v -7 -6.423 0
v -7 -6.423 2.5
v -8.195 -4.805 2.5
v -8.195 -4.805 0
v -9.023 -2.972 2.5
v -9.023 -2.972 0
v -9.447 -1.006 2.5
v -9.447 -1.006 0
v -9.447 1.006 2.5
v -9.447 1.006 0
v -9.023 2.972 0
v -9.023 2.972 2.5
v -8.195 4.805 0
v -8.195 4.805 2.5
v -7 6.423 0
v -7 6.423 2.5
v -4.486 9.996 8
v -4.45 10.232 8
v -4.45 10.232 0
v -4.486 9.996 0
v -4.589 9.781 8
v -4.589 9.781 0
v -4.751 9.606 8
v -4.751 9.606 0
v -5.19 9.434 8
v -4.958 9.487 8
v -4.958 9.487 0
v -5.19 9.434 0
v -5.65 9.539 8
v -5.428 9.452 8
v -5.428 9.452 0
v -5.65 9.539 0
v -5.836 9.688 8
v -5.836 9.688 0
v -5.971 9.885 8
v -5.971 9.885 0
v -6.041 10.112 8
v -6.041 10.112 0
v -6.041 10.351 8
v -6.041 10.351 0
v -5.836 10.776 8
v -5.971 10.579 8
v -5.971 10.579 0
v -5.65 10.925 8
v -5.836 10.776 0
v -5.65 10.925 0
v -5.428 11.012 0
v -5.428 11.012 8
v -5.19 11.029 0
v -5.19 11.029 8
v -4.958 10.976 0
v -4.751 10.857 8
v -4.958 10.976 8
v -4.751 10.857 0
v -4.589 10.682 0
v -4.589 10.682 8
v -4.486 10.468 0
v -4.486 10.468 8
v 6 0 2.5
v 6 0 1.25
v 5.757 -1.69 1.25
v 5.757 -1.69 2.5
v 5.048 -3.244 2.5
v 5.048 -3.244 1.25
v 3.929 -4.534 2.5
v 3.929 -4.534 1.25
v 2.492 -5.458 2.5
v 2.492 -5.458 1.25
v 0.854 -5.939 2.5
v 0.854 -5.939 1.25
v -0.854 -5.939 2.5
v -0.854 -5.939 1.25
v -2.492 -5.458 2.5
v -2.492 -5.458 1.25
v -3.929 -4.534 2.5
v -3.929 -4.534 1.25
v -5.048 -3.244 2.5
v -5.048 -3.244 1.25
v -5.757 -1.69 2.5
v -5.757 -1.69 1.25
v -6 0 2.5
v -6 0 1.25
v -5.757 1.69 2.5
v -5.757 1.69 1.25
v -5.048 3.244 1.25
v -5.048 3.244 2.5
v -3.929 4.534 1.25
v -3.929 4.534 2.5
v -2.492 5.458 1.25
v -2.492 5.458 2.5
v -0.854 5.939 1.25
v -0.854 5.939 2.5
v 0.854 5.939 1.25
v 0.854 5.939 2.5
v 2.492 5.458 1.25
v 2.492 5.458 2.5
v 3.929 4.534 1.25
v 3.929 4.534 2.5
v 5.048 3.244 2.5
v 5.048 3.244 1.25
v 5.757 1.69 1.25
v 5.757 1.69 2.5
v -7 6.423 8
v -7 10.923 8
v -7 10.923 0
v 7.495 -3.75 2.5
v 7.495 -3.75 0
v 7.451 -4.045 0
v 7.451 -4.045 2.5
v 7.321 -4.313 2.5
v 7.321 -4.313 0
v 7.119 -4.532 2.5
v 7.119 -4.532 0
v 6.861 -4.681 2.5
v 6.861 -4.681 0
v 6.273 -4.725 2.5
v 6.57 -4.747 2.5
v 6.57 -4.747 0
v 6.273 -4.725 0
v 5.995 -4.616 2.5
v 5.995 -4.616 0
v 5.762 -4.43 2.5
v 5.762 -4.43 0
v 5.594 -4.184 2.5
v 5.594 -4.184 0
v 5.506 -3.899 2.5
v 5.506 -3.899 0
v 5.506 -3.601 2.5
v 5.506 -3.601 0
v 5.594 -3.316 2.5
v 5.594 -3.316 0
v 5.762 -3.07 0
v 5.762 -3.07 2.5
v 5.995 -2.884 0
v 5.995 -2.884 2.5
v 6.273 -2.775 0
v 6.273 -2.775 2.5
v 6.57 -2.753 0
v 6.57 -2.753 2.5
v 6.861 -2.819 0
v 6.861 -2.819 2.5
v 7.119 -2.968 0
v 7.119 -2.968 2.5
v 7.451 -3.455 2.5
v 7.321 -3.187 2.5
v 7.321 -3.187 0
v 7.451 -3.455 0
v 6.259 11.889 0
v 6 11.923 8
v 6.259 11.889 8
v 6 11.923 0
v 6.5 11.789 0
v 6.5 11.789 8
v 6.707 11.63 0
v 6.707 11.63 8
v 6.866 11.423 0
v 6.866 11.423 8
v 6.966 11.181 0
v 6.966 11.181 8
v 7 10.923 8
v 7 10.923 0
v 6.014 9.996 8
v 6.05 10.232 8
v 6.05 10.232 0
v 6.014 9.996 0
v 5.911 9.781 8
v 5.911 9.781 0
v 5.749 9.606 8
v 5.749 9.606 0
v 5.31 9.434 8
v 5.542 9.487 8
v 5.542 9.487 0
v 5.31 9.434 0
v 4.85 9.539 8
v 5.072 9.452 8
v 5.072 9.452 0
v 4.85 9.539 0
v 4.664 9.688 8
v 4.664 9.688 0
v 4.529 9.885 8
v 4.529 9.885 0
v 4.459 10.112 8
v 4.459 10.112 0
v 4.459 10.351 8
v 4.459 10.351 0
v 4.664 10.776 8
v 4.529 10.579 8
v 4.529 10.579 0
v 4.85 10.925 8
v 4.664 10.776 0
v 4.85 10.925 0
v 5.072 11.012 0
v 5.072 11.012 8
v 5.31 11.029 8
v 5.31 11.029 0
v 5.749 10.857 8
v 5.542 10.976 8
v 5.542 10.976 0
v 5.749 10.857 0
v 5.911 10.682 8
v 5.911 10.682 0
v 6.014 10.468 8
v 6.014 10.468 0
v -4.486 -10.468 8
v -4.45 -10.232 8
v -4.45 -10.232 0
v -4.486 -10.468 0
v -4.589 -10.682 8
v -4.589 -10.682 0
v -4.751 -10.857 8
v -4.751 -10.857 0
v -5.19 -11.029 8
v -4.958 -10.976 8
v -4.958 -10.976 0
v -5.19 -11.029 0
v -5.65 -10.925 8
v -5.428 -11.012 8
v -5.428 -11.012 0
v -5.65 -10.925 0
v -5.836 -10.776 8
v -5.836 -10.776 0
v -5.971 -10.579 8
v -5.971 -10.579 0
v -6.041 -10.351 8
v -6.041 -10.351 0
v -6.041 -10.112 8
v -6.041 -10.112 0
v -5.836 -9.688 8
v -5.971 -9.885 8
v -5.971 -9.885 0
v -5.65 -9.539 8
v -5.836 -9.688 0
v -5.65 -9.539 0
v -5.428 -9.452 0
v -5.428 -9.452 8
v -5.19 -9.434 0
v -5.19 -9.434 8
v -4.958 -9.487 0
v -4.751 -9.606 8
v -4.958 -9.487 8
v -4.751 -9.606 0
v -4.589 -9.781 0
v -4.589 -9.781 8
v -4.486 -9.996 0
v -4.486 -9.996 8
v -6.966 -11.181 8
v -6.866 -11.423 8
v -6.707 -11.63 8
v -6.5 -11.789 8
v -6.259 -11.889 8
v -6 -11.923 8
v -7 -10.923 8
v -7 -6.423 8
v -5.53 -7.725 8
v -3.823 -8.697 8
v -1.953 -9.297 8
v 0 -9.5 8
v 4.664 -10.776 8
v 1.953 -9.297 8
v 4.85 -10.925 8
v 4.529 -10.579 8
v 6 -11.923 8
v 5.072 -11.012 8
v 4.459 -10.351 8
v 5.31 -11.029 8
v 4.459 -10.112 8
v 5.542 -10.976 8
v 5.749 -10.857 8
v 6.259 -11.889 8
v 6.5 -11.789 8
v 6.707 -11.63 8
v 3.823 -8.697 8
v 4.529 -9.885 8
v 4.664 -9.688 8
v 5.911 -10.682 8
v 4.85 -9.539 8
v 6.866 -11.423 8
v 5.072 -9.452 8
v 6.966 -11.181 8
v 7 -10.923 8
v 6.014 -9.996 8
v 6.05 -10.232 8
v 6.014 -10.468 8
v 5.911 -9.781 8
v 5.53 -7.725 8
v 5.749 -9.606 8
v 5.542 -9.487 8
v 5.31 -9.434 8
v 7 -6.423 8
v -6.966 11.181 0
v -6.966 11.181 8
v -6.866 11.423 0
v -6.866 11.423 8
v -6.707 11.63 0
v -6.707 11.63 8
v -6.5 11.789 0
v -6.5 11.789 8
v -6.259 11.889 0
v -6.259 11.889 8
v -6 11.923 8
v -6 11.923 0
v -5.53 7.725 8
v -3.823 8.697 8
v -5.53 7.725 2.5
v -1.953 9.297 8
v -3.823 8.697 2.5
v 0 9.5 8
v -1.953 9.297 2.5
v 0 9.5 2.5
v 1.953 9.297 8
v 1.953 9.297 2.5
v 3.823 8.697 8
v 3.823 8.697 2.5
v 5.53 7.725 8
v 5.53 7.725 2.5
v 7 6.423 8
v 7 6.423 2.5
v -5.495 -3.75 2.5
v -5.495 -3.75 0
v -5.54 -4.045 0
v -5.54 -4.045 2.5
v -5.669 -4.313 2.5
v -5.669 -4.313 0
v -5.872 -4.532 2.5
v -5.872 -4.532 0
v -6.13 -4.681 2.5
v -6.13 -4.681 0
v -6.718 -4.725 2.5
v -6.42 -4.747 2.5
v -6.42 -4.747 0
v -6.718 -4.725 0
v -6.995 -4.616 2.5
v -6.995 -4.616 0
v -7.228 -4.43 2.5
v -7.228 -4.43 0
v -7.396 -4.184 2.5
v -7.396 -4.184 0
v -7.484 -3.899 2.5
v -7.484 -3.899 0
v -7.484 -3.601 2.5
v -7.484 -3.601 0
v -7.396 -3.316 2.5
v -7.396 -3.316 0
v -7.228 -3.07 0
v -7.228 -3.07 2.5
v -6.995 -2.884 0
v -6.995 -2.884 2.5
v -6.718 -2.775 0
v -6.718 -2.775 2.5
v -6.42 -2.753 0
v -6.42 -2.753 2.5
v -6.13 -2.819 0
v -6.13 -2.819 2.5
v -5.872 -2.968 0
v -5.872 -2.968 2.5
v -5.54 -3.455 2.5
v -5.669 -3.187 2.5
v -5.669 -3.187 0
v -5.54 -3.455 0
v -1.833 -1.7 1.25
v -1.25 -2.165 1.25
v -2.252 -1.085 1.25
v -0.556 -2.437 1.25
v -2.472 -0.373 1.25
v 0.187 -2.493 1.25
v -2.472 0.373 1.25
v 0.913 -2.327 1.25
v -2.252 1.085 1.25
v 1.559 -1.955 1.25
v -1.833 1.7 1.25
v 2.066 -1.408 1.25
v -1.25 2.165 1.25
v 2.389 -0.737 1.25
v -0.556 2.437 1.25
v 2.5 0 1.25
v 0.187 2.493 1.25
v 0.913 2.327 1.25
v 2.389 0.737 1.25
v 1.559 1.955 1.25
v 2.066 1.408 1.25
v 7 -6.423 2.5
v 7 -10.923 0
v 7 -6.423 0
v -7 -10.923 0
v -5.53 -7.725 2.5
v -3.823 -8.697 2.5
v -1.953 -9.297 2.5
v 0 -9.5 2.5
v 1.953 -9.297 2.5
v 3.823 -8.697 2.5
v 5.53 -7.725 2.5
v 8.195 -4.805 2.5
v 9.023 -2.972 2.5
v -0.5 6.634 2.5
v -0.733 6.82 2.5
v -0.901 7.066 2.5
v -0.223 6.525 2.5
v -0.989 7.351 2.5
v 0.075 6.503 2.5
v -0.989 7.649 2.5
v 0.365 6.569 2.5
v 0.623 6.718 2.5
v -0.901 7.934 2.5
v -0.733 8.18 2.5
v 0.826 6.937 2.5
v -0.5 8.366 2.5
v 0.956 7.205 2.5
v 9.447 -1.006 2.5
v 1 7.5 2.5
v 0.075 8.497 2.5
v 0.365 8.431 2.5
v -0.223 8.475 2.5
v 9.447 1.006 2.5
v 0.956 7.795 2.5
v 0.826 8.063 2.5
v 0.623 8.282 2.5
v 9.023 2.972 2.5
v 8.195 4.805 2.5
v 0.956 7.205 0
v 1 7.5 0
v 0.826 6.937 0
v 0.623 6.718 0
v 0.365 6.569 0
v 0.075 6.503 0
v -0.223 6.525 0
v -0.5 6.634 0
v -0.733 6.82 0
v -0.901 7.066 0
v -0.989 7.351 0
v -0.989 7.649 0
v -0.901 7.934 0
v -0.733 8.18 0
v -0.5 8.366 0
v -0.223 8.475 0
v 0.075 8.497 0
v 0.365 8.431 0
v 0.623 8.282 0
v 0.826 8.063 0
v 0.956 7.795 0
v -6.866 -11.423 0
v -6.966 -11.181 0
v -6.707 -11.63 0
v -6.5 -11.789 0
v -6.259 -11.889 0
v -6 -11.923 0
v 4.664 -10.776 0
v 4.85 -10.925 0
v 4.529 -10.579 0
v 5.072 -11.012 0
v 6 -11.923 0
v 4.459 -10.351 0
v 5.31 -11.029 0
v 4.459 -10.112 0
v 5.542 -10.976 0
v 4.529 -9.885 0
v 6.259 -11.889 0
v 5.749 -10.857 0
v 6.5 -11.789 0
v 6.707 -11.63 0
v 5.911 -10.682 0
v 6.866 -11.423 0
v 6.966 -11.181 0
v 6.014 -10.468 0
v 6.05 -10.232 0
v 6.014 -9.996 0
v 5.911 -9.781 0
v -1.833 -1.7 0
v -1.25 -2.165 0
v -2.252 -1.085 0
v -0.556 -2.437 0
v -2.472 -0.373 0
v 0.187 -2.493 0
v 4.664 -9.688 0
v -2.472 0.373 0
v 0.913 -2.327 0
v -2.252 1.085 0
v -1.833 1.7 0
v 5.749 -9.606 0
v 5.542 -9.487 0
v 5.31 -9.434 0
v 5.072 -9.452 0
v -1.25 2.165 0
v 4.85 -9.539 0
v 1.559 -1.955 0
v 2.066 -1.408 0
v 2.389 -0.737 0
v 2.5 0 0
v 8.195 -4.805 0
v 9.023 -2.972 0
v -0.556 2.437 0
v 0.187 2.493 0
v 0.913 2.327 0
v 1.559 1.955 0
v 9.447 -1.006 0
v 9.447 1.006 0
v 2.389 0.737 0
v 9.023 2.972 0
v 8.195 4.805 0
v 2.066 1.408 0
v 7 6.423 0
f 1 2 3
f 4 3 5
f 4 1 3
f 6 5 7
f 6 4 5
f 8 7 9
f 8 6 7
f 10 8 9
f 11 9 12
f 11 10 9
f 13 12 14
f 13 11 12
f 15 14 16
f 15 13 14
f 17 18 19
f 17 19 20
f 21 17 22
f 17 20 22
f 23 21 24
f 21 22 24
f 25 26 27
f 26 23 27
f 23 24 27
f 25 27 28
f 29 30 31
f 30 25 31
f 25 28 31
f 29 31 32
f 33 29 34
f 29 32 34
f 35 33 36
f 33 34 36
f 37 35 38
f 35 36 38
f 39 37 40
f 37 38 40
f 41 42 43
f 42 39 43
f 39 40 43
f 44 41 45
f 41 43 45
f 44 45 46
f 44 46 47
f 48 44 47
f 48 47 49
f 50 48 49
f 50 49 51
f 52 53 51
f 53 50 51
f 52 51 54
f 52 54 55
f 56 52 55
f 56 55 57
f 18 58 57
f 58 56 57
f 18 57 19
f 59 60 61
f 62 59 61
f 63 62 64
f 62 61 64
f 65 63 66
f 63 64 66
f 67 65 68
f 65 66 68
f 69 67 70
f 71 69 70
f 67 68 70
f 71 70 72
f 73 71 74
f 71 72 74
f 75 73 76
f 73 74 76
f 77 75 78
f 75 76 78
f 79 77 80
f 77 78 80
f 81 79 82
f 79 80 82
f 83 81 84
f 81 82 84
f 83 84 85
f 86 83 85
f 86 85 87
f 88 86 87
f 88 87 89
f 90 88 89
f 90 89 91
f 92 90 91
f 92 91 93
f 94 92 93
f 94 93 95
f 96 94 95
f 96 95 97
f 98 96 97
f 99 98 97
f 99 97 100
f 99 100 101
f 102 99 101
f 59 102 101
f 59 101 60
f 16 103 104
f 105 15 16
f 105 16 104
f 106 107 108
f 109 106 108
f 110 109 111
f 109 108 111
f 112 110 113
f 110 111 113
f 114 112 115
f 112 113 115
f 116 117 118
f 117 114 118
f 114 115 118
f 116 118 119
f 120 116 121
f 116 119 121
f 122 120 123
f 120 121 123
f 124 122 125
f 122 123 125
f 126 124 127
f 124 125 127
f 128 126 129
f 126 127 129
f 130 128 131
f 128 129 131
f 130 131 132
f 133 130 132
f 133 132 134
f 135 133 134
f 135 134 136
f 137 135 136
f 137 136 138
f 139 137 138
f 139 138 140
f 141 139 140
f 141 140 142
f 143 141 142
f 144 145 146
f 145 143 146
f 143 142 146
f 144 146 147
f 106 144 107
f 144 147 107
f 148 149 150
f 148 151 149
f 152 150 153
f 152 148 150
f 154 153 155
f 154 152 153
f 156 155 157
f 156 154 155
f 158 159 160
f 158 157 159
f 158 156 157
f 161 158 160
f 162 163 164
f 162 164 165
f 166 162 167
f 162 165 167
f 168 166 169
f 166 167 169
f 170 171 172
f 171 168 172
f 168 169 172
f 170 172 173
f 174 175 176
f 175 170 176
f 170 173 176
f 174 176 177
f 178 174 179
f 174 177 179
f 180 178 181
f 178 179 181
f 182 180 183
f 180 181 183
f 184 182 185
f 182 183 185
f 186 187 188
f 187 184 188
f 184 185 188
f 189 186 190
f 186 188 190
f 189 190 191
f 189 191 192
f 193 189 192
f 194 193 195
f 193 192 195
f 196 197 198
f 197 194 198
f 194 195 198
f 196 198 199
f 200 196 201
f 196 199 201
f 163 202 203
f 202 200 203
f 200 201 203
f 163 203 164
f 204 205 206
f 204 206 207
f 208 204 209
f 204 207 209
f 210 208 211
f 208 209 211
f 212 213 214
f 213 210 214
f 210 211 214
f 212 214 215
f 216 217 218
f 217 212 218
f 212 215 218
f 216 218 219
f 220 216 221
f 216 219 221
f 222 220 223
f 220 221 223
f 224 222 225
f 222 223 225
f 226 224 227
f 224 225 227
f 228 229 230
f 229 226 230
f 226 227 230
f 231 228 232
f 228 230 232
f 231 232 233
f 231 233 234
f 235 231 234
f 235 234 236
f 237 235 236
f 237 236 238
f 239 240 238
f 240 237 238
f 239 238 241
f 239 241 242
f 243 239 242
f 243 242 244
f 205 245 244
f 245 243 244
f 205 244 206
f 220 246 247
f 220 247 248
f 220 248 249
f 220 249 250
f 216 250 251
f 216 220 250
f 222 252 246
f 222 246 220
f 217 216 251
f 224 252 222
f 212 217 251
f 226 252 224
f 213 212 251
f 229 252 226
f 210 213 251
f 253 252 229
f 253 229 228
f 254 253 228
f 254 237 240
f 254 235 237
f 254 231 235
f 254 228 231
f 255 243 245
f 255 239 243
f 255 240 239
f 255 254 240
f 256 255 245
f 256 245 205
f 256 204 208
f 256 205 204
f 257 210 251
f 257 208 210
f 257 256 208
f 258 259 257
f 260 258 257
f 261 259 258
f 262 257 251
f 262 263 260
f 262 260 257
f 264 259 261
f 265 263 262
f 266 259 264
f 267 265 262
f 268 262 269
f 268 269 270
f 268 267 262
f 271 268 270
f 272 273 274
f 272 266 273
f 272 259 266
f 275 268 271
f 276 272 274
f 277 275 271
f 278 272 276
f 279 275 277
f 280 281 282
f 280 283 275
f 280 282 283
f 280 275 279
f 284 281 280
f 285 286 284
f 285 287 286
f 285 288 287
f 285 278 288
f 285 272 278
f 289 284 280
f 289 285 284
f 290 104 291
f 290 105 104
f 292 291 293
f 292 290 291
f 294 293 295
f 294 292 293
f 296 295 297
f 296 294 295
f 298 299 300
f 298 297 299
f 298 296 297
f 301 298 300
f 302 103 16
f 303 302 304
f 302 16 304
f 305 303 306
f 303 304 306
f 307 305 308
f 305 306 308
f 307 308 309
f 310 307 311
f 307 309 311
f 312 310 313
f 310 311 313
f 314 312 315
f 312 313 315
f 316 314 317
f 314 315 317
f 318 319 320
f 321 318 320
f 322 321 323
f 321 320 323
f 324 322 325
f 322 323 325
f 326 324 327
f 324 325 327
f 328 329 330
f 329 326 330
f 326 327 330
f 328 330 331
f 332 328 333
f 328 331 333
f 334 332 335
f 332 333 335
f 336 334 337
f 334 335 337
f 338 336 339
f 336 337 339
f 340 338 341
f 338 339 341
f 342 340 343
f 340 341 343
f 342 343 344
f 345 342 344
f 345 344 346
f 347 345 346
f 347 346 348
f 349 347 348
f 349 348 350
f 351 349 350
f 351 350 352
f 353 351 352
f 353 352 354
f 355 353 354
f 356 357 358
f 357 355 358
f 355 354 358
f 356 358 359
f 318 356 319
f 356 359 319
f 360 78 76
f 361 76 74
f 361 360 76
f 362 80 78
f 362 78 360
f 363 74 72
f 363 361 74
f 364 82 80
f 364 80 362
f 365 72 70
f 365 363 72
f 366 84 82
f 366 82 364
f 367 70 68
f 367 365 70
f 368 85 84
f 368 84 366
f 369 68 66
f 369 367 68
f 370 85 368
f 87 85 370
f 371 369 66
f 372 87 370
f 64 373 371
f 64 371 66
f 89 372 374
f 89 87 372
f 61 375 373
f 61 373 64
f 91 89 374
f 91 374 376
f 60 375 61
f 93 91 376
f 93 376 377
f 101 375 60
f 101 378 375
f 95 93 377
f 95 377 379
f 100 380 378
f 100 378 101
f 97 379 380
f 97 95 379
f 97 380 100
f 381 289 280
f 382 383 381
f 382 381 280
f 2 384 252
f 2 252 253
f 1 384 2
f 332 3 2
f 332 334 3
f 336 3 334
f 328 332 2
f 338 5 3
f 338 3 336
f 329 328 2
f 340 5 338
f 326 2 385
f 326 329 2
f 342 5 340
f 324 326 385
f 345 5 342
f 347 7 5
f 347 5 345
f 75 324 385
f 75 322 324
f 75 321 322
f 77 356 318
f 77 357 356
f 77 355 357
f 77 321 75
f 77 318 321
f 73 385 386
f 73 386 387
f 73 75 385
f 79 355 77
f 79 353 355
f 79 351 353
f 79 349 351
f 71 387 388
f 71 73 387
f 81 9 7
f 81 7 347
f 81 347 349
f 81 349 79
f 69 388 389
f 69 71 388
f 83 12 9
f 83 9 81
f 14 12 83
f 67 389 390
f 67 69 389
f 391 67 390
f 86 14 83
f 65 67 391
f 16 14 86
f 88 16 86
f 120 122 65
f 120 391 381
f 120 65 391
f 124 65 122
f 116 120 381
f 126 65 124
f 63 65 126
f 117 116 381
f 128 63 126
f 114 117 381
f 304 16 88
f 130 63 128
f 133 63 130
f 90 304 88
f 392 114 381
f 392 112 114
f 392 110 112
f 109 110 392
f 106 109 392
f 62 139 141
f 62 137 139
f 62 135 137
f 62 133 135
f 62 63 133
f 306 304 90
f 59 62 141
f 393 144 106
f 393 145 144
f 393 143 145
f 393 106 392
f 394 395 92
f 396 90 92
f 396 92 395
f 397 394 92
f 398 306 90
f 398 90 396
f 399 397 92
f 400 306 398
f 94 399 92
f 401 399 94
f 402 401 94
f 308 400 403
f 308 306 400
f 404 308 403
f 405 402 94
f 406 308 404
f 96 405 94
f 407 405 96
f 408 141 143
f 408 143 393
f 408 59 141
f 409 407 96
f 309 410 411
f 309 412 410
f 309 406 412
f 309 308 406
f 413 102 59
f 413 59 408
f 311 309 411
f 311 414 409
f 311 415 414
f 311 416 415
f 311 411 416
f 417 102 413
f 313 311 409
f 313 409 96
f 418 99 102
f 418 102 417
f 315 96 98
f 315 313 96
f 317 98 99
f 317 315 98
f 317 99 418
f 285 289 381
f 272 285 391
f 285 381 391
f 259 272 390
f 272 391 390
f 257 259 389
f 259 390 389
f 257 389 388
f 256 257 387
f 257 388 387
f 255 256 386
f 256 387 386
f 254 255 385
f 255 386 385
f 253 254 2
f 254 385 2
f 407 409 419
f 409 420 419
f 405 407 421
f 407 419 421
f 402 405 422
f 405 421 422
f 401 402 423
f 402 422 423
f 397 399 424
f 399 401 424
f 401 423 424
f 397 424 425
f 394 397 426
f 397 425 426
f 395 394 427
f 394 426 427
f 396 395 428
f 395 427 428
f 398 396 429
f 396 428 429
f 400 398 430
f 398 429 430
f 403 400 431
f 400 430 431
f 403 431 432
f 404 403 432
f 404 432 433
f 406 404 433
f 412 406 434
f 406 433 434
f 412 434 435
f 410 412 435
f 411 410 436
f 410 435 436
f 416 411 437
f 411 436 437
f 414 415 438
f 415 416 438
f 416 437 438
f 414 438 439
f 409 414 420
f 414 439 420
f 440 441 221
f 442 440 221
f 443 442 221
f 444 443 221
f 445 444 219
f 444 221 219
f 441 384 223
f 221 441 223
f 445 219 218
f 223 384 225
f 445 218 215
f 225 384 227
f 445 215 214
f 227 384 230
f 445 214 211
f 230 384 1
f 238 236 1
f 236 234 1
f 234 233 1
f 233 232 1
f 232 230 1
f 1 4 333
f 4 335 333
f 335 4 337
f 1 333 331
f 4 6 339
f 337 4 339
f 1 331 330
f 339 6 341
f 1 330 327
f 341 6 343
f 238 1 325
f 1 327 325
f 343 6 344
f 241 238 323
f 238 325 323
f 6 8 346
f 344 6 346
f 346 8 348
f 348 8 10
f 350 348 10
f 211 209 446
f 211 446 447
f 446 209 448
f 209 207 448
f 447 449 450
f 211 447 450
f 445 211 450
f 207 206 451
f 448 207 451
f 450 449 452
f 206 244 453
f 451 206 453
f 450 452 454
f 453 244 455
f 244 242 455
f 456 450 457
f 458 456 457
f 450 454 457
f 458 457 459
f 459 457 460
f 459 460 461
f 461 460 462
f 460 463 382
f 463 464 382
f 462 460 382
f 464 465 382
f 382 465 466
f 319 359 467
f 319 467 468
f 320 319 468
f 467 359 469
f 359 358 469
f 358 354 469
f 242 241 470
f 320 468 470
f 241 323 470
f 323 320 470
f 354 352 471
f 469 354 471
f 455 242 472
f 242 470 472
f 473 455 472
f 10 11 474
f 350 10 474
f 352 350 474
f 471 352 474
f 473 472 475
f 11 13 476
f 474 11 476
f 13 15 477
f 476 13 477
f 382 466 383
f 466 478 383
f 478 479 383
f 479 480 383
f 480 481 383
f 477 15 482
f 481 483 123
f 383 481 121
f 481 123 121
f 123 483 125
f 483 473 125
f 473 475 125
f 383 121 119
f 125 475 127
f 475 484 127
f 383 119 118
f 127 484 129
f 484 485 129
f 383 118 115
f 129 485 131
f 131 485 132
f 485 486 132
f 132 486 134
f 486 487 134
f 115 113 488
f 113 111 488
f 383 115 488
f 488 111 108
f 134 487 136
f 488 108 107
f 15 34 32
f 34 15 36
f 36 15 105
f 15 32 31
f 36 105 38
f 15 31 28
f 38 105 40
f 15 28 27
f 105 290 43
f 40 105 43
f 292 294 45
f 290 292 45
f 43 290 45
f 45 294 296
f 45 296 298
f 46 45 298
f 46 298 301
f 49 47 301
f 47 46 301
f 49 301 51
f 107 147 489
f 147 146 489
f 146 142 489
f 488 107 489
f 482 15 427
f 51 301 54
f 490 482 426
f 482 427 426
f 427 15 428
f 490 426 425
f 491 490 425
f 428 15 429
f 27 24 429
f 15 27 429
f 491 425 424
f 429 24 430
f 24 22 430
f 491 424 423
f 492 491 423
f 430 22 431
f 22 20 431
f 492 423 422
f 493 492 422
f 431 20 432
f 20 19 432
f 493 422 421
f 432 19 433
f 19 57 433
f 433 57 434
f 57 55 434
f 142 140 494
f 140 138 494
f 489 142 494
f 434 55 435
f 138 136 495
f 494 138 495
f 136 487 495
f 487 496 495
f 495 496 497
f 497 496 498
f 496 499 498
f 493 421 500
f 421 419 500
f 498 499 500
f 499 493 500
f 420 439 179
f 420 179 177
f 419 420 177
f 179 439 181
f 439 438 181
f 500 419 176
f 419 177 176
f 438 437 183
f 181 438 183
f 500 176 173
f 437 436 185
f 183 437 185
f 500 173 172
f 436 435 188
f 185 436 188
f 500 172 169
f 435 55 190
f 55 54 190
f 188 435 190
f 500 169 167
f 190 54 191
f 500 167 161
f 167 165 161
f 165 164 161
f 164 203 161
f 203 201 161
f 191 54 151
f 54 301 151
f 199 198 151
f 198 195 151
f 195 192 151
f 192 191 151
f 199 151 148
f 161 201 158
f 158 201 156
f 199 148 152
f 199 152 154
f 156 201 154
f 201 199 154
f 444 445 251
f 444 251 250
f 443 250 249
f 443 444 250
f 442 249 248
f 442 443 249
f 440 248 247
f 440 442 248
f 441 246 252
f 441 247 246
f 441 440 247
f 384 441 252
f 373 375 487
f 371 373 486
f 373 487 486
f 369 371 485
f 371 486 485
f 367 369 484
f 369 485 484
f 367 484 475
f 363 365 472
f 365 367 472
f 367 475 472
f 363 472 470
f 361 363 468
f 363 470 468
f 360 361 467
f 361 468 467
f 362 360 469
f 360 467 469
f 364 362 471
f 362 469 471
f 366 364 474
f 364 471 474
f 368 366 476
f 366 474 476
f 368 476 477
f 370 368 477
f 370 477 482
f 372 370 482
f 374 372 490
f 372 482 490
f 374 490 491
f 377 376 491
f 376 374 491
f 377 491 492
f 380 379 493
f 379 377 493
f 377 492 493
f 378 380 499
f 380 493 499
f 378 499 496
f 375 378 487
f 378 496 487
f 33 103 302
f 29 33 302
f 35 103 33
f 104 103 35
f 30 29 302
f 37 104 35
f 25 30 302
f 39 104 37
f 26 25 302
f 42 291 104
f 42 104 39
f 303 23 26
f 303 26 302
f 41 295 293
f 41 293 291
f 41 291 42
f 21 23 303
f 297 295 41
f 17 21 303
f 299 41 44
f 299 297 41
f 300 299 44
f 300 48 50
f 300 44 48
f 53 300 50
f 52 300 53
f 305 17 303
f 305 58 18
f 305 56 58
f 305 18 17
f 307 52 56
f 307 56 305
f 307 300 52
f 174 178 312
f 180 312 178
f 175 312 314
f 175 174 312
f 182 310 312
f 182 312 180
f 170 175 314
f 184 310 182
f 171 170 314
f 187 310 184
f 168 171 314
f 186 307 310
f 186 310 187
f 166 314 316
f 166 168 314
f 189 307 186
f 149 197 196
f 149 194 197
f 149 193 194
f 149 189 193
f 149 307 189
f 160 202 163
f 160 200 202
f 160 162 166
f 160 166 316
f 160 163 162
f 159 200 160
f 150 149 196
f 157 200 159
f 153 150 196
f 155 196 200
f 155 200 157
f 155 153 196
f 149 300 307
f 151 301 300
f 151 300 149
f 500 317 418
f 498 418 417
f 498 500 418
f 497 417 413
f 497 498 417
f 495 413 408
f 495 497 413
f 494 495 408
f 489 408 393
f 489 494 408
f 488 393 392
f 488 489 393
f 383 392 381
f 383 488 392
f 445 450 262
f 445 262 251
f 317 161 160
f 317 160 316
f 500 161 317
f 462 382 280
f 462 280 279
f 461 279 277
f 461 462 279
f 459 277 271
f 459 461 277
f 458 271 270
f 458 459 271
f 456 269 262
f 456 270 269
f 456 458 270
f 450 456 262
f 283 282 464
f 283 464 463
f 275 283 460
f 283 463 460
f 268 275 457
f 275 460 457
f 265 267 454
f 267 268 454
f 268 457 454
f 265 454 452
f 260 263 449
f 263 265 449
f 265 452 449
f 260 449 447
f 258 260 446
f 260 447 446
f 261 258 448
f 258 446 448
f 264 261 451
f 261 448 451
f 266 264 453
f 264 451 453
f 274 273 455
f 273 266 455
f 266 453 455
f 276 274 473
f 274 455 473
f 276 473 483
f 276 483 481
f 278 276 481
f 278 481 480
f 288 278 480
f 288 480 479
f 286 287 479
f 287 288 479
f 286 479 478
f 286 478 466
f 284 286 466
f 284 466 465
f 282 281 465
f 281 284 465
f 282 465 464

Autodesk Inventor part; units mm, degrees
ref_plane "YZ Plane" through (0, 0, 0) normal (1, 0, 0) x (0, 1, 0)
ref_plane "XZ Plane" through (0, 0, 0) normal (0, 1, 0) x (-1, 0, 0)
ref_plane "XY Plane" through (0, 0, 0) normal (0, 0, 1) x (1, 0, 0)
sketch "スケッチ1" plane through (0, 0, 0) normal (0, 0, 1) x (1, 0, 0)
  circle A0 centre (0, 0) radius 2.5
  circle A1 centre (0, 0) radius 6
  circle A2 centre (0, 0) radius 9.5
  circle A3 centre (0, 7.5) radius 1
  circle A4 centre (0, 0) radius 7.5 construction
  line L0 (0, -20.3) -> (0, 20.3) projected
  circle A5 centre (-6.4952, -3.75) radius 1
  circle A6 centre (6.4952, -3.75) radius 1
  circle A7 centre (0, 0) radius 14.5 construction
  line L1 (-7, 6.4226) -> (-7, 10.9226)
  line L2 (-6, 11.9226) -> (6, 11.9226)
  line L3 (7, 10.9226) -> (7, 6.4226)
  arc A8 (-6, 11.9226) -> (-7, 10.9226) centre (-6, 10.9226) ccw
  arc A9 (7, 10.9226) -> (6, 11.9226) centre (6, 10.9226) ccw
  circle A10 centre (5.25, 10.2317) radius 2 construction
  circle A11 centre (5.25, 10.2317) radius 0.8
  circle A12 centre (-5.25, 10.2317) radius 2 construction
  circle A13 centre (-5.25, 10.2317) radius 0.8
  line L4 (-5.25, 10.2317) -> (-5.25, 7.9175) construction
  line L5 (5.25, 10.2317) -> (5.25, 7.9175) construction
  circle A14 centre (5.25, -10.2317) radius 0.8
  line L6 (7, -6.4226) -> (7, -10.9226)
  arc A15 (6, -11.9226) -> (7, -10.9226) centre (6, -10.9226) ccw
  line L7 (6, -11.9226) -> (-6, -11.9226)
  circle A16 centre (-5.25, -10.2317) radius 2 construction
  line L8 (-7, -10.9226) -> (-7, -6.4226)
  arc A17 (-7, -10.9226) -> (-6, -11.9226) centre (-6, -10.9226) ccw
  circle A18 centre (-5.25, -10.2317) radius 0.8
  circle A19 centre (5.25, -10.2317) radius 2 construction
  dimension "d4" = 15
  dimension "d0" = 5
  dimension "d1" = 12
  dimension "d2" = 19
  dimension "d3" = 2
  dimension "d7" = 360
  dimension "d13" = 29
  dimension "d14" = 1
  dimension "d15" = 12
  dimension "d16" = 4.5
  dimension "d17" = 4
  dimension "d18" = 1.6
  dimension "d19" = 10.5
  dimension "d22" = 360
extrude "押し出し1" add sketch "スケッチ1" along normal blind 1.25 contours A0 L0 A1 | A0 L0 A1 | L0 A3 A2 A1 | A1 L0 A2 A3
extrude "押し出し2" add sketch "スケッチ1" along normal blind 2.5 contours L0 A3 A2 A1 | A1 L0 A2 A3
extrude "押し出し3" add sketch "スケッチ1" along normal blind 8 contours L0 L7 A17 L8 A2 | A2 L6 A15 L7 L0 | L0 L2 A9 L3 A2 | A2 L1 A8 L2 L0
properties part number "MotorMount_sub"
